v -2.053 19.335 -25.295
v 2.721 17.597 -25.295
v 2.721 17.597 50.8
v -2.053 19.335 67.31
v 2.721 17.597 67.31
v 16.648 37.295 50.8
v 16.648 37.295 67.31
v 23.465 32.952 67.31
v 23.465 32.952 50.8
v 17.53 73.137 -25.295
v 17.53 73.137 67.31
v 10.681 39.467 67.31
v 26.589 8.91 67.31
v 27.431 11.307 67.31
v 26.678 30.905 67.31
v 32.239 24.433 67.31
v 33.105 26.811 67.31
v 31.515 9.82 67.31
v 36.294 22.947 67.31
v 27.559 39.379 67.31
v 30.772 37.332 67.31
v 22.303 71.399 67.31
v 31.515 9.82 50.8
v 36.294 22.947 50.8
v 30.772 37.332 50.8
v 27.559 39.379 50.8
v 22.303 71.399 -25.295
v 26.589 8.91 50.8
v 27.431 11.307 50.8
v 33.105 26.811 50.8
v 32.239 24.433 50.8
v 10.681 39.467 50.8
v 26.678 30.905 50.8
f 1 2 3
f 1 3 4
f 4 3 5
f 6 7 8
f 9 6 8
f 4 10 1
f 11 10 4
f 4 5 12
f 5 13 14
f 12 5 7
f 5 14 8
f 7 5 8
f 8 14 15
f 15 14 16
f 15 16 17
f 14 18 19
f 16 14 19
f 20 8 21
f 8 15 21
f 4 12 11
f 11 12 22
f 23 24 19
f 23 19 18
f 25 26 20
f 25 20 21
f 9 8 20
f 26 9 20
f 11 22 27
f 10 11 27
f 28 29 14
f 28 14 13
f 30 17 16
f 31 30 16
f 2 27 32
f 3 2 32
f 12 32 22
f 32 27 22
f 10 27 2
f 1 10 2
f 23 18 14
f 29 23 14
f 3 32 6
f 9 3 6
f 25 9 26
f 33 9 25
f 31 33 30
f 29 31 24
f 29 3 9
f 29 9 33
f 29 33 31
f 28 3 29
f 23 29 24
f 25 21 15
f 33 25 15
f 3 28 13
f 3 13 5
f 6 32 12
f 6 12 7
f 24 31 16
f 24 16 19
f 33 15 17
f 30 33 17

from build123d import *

# Parameters (mm, degrees)
SKETCH1_W      = 203.2
SKETCH1_H      = 101.6
EXTRUDE1_DEPTH = 50.8
EXTRUDE2_DEPTH = 16.51
SKETCH23_W     = 203.2
SKETCH23_H     = 50.8
EXTRUDE3_DEPTH = 508
SKETCH24_W     = 16.51
SKETCH24_H     = 23.273283323
EXTRUDE6_DEPTH = 5.08


with BuildPart() as part:
    # Sketch1 → Extrude1 (new body)
    with BuildSketch(Plane.XY):
        with Locations((101.6, 50.8)):
            Rectangle(SKETCH1_W, SKETCH1_H)
    extrude(amount=EXTRUDE1_DEPTH)

    # Sketch21 → Extrude2 (add)
    with BuildSketch(Plane.XY.offset(50.8)):
        Polygon((10.680914086, 39.466921448), (16.647962228, 37.295093538), (23.464694461, 32.952356157), (27.558917476, 39.378998974), (30.772238885, 37.331887466), (26.678015869, 30.905244649), (33.104658686, 26.811021633), (32.238976379, 24.432579042), (36.293520259, 22.947359397), (31.515498857, 9.819853485), (27.43078785, 11.306566707), (26.589174956, 8.909877207), (2.720982388, 17.597188848), align=None)
    extrude(amount=EXTRUDE2_DEPTH)

    # Sketch23 → Extrude3 (cut)
    with BuildSketch(Plane.XZ):
        with Locations((101.6, 25.4)):
            Rectangle(SKETCH23_W, SKETCH23_H)
    extrude(amount=-EXTRUDE3_DEPTH, mode=Mode.SUBTRACT)

    # Sketch24 → Extrude6 (add)
    with BuildSketch(Plane(origin=(-3.252939565, 1.183973176, 0), x_dir=(0, 0, 1), z_dir=(-0.9396926207859065, 0.3420201433256742, 0))):
        Polygon((-25.295320048, 17.466579293), (50.8, 17.466579293), (50.8, 40.739862616), (67.31, 40.739862616), (67.31, 74.721559979), (50.8, 74.721559979), (-25.295320048, 74.721559979), align=None)
        with Locations((59.055, 29.103220955)):
            Rectangle(SKETCH24_W, SKETCH24_H)
    extrude(amount=EXTRUDE6_DEPTH)


solid = part.part
